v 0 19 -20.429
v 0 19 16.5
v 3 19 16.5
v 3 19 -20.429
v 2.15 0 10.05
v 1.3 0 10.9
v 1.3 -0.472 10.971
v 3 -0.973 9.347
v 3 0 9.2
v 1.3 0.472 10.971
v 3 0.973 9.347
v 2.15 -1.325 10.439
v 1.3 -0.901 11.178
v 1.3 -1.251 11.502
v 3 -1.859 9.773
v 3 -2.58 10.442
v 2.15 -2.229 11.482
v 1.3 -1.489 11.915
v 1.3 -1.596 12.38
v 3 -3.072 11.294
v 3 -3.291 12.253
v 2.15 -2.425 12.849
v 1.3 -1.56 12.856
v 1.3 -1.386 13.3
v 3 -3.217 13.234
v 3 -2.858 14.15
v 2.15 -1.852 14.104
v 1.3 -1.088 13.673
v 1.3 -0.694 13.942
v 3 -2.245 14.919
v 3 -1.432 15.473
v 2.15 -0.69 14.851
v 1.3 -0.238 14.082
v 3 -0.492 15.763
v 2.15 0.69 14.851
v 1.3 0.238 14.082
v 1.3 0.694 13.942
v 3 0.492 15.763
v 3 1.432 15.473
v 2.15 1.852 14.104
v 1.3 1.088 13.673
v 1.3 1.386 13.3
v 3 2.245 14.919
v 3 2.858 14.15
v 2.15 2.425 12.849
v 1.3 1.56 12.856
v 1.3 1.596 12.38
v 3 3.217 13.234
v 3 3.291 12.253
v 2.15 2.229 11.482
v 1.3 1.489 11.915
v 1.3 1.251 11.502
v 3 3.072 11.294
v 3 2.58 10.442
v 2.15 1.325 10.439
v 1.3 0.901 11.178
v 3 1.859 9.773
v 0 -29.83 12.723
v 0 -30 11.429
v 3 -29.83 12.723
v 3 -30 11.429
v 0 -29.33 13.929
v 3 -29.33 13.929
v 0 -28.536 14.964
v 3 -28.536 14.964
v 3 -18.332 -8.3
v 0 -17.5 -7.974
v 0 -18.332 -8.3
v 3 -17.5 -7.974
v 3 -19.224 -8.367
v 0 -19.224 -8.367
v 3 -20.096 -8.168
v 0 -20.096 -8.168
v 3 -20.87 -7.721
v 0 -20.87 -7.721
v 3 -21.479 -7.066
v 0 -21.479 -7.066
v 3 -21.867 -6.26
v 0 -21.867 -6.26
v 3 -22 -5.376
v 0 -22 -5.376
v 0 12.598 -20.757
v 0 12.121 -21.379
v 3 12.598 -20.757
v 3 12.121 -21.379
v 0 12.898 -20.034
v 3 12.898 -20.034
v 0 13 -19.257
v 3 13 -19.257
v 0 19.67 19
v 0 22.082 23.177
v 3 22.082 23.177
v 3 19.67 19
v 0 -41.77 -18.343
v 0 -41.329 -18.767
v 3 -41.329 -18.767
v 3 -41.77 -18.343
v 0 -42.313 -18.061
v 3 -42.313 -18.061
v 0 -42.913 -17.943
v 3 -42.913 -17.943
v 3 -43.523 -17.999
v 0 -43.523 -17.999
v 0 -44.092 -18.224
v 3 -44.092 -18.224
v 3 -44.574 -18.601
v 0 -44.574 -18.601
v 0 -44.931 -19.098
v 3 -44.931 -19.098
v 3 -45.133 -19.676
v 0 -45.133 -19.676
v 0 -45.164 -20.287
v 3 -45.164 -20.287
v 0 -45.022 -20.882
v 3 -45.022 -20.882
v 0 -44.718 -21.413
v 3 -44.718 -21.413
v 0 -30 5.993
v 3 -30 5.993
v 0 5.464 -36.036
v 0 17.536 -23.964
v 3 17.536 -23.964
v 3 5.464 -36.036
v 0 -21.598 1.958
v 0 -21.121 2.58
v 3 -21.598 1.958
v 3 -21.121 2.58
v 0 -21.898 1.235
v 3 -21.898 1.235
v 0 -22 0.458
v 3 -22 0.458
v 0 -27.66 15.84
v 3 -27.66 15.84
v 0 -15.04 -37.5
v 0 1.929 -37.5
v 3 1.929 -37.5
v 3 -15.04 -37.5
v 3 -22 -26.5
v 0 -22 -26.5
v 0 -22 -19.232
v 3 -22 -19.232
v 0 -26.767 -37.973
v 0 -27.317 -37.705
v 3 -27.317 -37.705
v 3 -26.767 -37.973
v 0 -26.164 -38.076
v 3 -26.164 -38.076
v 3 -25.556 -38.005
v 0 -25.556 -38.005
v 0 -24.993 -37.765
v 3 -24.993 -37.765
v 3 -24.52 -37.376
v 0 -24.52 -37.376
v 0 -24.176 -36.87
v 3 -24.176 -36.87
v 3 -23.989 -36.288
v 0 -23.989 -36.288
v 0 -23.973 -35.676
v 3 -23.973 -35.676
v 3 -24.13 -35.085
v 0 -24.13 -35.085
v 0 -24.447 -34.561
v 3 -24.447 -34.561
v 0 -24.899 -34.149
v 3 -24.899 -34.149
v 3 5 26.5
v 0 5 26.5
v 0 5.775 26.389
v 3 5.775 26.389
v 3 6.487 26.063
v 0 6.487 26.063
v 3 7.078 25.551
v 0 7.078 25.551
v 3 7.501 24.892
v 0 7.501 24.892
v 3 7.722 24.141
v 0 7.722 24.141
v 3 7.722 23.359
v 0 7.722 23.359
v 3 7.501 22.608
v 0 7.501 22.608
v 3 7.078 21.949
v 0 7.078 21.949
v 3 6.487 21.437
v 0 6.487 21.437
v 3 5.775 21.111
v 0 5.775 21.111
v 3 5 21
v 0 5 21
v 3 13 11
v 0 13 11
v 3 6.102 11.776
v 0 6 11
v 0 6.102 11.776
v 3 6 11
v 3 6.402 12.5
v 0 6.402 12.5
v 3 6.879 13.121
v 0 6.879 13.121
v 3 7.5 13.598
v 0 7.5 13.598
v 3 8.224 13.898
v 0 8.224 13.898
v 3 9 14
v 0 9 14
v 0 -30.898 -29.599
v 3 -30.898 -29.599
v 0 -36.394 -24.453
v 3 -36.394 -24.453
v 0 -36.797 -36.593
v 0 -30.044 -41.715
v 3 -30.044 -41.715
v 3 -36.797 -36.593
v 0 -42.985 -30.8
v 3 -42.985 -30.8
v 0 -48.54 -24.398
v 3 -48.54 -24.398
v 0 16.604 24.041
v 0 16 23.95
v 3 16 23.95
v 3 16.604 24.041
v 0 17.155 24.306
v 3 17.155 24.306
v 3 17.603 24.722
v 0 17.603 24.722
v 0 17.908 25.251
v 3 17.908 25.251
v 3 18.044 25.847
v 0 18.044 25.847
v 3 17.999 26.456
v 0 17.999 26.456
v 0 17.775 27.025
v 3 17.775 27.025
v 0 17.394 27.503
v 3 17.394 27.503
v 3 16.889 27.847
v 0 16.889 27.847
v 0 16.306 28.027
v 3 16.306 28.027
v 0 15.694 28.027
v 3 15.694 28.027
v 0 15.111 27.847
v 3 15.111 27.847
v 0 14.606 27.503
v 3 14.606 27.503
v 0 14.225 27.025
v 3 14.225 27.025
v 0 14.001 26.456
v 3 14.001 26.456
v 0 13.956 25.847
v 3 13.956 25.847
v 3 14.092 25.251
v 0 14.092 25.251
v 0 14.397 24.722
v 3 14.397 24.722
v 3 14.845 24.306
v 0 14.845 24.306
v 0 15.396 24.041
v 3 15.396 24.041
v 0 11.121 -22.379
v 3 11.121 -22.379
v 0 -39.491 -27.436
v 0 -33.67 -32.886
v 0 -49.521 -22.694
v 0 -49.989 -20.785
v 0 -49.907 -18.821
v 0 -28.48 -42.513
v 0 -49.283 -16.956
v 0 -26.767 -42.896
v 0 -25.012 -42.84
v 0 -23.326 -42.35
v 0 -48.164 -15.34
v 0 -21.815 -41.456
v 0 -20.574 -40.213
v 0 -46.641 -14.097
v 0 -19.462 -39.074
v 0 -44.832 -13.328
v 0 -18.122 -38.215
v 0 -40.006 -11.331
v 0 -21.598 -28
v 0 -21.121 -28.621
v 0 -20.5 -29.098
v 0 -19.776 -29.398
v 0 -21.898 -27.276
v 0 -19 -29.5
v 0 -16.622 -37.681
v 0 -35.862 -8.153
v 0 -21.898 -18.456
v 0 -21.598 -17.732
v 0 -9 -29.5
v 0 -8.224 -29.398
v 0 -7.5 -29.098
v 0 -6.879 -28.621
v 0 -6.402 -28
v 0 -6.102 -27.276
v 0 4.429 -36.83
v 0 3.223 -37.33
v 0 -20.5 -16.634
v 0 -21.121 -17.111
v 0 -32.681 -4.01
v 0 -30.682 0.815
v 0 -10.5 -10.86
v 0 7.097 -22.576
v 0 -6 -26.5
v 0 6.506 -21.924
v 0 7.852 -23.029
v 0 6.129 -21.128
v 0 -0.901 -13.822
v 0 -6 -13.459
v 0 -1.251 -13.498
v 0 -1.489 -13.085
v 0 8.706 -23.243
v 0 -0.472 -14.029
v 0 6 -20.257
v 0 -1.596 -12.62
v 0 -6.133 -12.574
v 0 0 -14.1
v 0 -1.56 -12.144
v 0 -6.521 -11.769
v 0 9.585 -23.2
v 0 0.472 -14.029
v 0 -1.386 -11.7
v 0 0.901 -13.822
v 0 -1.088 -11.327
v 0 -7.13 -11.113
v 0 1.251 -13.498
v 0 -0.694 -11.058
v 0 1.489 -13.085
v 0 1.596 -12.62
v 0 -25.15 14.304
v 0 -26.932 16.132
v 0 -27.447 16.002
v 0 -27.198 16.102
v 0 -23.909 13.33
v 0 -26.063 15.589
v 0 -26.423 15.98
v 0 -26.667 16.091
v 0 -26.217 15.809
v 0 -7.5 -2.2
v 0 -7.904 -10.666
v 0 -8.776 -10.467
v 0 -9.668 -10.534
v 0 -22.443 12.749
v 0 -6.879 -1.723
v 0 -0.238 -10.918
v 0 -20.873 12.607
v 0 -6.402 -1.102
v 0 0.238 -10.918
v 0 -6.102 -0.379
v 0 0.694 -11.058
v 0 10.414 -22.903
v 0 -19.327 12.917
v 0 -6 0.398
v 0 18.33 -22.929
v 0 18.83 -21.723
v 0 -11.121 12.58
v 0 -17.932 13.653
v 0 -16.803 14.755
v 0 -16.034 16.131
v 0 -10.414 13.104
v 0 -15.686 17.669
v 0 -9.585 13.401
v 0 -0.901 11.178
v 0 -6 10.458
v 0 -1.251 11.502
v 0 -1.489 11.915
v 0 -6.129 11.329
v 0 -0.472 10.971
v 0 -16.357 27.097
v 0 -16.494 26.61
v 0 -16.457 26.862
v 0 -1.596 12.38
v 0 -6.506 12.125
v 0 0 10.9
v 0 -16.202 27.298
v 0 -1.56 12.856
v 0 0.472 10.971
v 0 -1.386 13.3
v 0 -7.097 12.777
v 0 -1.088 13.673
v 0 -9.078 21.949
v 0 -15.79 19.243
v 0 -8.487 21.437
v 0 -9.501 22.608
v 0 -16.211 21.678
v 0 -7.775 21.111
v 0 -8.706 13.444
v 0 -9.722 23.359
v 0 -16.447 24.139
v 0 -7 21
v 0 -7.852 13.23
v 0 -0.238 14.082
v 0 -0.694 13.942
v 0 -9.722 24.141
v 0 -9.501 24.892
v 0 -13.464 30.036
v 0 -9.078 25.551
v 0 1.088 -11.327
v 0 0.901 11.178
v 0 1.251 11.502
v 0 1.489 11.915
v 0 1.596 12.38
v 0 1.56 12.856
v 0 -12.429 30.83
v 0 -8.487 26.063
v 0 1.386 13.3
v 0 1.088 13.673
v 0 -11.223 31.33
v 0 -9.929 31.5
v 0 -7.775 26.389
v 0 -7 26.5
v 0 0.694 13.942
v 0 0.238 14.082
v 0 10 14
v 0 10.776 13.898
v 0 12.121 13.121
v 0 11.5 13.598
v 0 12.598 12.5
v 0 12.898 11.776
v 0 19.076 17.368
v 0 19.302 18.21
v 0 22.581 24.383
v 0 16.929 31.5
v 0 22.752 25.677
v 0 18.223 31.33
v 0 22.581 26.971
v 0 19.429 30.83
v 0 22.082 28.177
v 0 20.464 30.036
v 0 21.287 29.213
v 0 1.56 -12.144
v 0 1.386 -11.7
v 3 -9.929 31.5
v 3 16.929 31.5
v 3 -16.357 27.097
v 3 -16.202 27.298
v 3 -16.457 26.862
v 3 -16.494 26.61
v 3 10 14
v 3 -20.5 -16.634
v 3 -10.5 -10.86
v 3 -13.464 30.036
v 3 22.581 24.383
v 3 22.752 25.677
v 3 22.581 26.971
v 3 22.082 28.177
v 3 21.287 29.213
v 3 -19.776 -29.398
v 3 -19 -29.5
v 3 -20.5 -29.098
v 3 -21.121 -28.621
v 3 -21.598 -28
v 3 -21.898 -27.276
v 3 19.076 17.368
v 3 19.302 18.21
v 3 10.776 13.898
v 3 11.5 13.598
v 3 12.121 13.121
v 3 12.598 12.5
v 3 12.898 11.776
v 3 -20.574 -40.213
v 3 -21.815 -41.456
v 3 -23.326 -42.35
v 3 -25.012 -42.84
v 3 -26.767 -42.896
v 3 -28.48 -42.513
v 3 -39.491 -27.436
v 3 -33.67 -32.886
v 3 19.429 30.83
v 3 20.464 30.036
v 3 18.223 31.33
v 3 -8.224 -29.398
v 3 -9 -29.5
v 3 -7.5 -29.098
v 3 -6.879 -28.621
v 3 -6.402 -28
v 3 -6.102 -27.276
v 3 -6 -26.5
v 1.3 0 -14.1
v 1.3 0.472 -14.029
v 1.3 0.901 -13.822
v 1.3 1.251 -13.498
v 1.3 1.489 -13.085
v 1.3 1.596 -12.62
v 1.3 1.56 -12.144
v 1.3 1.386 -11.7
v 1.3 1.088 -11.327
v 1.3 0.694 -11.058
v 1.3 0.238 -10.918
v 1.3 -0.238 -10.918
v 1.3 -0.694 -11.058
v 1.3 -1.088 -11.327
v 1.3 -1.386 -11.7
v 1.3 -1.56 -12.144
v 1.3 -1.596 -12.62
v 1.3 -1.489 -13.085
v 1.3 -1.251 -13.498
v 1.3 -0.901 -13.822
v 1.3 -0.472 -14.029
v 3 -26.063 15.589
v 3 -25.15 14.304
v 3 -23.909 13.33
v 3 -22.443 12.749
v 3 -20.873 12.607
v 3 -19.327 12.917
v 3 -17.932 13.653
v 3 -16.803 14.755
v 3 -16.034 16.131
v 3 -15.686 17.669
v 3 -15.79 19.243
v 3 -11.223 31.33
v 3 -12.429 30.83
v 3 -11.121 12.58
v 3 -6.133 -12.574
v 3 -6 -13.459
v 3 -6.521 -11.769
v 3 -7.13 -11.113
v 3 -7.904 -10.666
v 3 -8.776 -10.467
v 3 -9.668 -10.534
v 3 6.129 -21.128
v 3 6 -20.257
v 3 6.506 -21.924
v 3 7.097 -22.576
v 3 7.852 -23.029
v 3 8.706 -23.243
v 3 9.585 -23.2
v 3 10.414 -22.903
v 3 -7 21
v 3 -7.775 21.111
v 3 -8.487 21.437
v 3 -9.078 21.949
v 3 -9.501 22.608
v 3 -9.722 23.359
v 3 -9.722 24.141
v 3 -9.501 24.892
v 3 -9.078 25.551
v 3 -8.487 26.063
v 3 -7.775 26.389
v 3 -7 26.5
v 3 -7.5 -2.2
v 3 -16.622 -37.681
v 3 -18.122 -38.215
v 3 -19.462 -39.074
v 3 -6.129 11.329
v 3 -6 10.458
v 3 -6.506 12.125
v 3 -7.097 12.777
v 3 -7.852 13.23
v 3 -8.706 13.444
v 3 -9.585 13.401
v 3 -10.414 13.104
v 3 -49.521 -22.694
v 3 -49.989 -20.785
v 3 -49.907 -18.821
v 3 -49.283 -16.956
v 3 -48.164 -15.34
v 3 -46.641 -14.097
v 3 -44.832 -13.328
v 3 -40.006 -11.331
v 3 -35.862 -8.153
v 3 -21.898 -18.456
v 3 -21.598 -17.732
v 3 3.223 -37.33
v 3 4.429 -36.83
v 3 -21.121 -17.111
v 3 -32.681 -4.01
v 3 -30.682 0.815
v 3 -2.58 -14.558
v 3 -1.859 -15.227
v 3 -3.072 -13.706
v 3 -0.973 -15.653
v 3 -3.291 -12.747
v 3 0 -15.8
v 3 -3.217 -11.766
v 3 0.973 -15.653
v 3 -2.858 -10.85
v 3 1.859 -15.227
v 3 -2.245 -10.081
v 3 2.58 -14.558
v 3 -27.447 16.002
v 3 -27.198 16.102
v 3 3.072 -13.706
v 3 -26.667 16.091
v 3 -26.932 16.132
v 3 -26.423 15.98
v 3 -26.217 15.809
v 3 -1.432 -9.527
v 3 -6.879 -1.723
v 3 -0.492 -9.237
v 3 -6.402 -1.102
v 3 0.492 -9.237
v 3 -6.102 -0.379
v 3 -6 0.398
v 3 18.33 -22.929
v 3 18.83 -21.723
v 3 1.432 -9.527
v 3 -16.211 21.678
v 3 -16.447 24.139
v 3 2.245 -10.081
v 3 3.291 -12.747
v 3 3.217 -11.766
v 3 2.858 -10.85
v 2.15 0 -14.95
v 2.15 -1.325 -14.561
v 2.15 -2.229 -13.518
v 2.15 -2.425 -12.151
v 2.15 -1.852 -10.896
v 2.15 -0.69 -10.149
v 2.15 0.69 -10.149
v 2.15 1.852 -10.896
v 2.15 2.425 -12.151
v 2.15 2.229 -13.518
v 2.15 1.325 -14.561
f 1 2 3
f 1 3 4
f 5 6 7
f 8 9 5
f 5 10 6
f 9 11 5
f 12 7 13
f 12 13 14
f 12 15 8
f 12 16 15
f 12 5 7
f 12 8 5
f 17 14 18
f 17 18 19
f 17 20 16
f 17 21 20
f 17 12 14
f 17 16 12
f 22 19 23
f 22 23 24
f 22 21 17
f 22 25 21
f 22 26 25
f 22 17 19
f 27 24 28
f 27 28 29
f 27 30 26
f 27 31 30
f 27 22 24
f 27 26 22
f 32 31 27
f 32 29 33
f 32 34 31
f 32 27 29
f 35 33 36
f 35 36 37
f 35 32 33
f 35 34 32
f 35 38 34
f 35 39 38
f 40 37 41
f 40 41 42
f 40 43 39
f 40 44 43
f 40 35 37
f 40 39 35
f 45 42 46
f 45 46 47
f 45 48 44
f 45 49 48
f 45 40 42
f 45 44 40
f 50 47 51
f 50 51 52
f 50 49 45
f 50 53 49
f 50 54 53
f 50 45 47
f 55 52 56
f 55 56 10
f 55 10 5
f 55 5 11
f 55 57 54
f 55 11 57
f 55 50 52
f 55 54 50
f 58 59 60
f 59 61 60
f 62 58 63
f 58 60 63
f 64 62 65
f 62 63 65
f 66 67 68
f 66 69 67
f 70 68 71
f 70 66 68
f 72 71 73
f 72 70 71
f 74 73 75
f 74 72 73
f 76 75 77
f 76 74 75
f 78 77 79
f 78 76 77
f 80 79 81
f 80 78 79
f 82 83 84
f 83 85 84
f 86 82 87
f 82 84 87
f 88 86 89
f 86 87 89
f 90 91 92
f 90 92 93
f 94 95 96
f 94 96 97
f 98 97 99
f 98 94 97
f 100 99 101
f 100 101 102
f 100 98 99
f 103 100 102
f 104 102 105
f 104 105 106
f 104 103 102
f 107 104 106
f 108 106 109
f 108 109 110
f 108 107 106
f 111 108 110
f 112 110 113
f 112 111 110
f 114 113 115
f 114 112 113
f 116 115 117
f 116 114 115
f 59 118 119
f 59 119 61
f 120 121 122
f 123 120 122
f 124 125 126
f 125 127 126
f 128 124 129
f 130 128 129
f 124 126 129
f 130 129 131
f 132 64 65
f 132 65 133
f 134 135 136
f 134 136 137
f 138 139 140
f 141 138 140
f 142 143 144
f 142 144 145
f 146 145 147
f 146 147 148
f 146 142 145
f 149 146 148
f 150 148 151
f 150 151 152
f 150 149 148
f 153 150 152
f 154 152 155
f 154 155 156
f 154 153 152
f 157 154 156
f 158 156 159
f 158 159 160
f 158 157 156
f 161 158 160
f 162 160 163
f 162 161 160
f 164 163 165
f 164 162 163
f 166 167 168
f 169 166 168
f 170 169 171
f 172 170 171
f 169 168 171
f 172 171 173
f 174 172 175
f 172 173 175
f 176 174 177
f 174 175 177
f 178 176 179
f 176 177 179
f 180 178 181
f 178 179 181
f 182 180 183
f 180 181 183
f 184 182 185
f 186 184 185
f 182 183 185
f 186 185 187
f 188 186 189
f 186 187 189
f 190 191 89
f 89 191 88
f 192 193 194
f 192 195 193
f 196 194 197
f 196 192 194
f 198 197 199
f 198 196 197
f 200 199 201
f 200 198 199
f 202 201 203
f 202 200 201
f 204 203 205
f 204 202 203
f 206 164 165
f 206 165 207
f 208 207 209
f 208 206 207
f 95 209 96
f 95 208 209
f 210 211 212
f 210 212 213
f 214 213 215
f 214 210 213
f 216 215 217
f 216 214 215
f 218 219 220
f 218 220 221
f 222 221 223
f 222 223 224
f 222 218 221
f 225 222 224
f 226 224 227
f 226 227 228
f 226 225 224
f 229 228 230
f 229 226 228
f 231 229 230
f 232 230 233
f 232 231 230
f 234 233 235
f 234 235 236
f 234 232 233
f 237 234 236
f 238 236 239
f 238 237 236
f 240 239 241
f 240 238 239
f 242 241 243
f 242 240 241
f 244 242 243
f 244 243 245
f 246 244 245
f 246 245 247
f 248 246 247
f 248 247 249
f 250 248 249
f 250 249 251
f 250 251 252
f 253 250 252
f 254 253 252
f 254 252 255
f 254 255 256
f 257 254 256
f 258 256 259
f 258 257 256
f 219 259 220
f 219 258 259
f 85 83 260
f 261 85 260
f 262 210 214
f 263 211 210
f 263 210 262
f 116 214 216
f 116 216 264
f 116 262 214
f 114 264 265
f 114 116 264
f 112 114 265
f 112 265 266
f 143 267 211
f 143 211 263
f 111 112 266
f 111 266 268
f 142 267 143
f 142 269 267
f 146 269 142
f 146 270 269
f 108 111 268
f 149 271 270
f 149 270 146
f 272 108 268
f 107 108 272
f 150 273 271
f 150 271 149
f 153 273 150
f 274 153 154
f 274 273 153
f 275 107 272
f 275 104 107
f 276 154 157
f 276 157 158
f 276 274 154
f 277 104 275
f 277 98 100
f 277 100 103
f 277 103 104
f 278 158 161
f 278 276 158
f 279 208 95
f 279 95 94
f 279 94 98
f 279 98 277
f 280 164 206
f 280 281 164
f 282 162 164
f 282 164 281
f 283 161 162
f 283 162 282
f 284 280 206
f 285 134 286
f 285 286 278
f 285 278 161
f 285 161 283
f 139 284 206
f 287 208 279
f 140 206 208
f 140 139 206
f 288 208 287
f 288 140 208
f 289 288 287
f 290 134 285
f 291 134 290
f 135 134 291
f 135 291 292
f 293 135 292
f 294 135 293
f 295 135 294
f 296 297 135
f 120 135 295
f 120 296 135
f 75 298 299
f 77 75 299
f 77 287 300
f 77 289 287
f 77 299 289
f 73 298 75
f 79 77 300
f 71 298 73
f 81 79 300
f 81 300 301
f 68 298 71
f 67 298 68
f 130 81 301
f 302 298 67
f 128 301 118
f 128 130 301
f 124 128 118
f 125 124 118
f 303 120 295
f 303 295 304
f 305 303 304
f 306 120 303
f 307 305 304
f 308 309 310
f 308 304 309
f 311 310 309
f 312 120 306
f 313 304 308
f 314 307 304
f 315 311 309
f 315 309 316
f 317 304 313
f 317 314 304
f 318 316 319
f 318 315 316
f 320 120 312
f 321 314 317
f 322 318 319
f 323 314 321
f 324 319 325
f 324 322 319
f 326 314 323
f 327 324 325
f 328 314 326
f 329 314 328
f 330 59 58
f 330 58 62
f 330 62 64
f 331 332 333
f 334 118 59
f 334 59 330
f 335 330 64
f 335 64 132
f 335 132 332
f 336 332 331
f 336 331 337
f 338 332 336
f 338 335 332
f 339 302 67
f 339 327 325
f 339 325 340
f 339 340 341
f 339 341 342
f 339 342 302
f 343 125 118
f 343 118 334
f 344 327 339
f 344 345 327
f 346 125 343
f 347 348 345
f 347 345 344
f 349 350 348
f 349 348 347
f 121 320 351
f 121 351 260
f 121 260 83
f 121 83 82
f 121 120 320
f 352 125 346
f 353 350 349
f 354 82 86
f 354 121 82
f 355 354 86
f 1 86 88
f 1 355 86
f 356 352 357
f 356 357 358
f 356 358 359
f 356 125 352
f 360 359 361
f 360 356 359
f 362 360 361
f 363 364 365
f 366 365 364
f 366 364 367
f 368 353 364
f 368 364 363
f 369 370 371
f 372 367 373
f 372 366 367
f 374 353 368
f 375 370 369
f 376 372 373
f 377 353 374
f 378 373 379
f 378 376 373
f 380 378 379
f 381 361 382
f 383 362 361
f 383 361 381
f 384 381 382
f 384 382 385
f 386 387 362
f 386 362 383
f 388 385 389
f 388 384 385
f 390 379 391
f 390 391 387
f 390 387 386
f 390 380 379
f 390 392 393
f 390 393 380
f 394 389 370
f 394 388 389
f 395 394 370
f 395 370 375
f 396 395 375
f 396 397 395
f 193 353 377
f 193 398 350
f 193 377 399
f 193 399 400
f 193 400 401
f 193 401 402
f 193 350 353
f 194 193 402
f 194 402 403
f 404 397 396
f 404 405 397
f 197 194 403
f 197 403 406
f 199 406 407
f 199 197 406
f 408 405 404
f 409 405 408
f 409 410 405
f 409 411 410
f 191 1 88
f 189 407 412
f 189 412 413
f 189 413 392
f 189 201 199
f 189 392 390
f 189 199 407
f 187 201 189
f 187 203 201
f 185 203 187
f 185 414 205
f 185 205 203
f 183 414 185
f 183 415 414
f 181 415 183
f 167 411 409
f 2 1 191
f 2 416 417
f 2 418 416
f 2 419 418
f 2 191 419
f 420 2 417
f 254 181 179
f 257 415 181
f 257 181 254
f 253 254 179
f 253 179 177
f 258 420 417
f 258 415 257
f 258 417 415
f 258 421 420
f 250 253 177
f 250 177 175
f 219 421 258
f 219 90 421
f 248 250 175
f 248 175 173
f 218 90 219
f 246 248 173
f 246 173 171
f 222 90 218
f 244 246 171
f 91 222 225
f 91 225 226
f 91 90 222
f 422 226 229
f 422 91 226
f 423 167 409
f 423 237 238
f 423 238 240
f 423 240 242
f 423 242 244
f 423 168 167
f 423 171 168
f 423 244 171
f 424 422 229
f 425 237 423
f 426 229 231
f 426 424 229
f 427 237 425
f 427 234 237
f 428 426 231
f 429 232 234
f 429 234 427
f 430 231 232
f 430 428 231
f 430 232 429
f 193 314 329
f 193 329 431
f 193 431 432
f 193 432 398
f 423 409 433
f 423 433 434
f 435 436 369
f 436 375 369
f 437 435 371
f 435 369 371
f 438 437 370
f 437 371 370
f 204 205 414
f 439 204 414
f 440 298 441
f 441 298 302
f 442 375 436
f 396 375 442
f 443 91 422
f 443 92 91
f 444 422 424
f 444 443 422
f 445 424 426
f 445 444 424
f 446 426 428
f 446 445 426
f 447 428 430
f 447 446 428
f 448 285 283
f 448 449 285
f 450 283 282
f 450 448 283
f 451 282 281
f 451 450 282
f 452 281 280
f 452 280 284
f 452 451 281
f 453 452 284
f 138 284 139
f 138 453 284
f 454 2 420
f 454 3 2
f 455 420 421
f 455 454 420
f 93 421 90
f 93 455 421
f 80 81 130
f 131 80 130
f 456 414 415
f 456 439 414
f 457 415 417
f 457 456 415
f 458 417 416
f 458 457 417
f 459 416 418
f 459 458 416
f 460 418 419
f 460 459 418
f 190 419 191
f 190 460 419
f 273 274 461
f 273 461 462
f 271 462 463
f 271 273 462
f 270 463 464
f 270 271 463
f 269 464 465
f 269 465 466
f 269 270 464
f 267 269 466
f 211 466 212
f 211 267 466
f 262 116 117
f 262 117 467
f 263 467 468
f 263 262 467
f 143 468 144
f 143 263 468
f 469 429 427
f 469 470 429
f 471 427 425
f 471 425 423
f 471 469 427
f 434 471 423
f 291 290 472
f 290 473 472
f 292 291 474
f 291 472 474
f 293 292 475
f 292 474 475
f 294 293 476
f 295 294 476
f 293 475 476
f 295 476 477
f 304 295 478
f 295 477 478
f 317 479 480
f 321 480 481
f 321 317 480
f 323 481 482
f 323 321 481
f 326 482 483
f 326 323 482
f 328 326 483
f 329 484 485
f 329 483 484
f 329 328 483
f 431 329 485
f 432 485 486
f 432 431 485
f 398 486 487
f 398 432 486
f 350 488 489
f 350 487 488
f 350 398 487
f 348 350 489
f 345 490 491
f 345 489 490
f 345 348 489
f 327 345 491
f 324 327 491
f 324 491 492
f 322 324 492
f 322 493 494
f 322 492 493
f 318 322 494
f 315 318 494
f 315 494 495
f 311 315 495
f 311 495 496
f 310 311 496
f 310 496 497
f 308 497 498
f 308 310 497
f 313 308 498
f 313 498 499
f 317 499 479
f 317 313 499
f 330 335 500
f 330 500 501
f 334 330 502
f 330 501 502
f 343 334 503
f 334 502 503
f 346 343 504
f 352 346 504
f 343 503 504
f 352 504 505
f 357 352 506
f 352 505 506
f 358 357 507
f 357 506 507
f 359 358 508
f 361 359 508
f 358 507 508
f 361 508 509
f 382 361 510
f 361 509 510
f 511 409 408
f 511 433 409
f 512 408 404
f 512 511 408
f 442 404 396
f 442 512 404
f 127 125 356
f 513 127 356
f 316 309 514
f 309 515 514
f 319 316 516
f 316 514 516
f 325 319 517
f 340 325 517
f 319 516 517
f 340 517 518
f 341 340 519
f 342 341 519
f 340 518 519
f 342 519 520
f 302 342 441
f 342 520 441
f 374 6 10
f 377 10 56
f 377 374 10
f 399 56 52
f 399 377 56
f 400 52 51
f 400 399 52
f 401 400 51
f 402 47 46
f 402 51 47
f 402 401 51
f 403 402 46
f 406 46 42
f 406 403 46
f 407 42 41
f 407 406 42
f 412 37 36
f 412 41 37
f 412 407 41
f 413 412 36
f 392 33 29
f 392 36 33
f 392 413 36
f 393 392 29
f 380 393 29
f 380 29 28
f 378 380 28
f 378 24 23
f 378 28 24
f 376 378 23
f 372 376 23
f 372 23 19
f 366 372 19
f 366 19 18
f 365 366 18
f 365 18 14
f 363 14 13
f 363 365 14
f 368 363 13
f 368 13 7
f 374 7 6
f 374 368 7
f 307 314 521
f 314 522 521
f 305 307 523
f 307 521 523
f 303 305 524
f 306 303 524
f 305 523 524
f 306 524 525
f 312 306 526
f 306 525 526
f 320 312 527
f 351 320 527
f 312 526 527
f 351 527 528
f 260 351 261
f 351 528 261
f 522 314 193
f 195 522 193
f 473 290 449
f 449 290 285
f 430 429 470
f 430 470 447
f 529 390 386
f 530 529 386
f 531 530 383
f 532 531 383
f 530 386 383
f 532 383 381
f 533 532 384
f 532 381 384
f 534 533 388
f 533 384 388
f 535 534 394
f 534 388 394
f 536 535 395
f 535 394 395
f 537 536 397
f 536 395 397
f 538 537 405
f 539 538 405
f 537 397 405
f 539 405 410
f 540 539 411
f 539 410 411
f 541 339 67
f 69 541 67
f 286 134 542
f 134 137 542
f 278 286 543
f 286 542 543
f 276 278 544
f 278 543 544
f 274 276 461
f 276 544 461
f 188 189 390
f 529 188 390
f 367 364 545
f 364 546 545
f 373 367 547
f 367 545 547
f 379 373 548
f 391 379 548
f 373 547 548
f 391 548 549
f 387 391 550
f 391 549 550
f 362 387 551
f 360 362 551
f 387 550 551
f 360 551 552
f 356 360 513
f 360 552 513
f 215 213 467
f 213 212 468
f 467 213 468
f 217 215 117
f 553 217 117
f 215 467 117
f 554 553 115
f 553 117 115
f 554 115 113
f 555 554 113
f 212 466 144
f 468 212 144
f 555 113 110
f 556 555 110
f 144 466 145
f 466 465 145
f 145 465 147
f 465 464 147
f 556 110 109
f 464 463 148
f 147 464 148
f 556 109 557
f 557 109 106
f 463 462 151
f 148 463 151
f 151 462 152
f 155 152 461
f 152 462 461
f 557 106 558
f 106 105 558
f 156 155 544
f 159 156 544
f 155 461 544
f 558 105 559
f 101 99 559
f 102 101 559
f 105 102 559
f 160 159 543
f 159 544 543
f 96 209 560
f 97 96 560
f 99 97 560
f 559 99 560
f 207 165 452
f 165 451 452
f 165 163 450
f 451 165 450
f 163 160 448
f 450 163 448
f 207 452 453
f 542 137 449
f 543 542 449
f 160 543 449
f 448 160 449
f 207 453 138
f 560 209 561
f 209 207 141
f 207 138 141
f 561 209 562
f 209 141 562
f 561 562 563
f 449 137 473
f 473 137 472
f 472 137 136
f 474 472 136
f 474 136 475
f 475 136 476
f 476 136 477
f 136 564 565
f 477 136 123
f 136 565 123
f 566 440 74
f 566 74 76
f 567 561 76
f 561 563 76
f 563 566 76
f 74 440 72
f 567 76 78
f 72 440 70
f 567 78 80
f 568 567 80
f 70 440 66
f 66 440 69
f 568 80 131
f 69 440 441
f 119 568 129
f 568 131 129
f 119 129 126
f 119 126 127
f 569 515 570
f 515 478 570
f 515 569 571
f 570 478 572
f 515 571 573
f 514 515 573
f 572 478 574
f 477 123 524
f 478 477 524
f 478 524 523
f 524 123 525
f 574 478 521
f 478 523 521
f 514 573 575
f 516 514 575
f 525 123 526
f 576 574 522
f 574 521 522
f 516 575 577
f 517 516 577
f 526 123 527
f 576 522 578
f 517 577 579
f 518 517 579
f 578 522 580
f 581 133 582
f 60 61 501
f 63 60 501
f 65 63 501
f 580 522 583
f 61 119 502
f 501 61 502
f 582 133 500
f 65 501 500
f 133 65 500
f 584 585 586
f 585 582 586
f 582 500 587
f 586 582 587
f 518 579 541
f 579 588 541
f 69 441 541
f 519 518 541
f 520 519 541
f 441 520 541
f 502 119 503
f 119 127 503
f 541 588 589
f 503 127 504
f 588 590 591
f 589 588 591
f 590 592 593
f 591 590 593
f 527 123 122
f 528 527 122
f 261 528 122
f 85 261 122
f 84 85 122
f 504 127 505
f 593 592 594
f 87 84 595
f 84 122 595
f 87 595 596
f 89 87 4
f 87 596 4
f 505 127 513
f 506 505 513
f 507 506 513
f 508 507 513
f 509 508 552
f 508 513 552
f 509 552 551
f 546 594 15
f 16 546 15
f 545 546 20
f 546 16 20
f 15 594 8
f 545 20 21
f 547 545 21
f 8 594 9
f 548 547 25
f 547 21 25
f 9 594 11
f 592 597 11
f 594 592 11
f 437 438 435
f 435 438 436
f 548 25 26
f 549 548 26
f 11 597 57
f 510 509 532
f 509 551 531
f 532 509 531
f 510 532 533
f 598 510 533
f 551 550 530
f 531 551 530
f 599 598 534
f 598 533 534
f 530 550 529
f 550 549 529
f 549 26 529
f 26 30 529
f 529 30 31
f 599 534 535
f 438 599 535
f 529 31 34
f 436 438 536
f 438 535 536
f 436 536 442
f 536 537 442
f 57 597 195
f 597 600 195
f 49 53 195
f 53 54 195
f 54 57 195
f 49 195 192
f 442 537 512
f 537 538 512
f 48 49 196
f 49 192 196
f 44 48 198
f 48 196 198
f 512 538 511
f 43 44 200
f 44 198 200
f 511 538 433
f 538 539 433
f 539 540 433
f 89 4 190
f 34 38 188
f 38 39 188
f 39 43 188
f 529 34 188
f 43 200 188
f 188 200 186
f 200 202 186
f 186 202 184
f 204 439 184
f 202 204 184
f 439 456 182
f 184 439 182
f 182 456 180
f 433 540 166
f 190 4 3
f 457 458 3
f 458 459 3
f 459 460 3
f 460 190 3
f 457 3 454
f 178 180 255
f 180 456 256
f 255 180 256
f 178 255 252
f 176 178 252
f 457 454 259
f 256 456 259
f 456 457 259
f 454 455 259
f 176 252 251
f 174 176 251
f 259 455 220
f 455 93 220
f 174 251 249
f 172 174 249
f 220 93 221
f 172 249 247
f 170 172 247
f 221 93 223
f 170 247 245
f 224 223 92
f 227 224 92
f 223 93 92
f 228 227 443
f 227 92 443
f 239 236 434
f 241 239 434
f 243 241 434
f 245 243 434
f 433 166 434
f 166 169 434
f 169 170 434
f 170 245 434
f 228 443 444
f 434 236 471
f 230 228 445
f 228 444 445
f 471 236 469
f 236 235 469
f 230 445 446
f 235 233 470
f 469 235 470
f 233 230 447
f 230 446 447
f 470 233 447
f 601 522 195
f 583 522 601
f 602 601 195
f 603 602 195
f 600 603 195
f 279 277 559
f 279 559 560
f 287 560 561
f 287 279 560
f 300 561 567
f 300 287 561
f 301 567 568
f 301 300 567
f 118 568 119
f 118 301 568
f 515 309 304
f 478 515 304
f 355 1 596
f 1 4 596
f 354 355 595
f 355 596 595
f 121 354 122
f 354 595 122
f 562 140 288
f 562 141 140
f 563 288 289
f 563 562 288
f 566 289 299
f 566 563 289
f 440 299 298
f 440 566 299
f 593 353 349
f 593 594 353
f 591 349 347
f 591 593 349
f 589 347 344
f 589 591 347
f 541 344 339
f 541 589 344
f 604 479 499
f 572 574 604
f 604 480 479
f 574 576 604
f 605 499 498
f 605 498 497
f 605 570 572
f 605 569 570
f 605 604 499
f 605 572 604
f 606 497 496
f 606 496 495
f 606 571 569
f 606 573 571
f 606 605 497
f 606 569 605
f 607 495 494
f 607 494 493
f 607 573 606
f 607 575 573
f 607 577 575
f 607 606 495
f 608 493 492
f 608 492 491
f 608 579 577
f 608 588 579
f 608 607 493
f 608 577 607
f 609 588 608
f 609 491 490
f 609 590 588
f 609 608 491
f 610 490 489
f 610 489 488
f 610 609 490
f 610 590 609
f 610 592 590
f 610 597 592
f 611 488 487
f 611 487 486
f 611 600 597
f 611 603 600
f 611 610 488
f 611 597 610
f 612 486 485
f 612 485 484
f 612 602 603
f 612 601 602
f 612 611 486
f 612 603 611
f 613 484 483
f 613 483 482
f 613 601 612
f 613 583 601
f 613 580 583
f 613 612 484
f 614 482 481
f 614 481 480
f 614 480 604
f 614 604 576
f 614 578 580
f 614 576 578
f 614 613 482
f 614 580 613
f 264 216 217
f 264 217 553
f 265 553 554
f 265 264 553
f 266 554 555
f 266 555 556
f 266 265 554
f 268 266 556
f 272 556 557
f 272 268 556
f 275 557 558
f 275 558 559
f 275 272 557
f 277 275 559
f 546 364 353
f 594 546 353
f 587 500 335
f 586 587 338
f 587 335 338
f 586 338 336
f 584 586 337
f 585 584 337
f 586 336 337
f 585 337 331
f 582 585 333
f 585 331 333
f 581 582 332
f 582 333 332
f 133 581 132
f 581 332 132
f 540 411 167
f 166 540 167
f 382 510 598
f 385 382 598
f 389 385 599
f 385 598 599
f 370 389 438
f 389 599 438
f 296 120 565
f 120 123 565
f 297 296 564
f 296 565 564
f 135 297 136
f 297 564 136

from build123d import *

# Parameters (mm, degrees)
SKETCH_1_R               = 1.6
SKETCH_1_R_2             = 2.05
EXTRUDE_1_DEPTH          = 3
HOLE_WIZARD_2_AT_2_COUNT = 2
HOLE_WIZARD_2_AT_2_PITCH = 25
FILLET_1_R               = 7
CUT_EXTRUDE_1_DEPTH      = 10
FILLET_2_R               = 1
CHAMFER_1_SIZE           = 15
FILLET_3_R               = 5
FILLET_4_R               = 3


with BuildPart() as part:
    # 草图1 → 凸台-拉伸1 (new body)
    with BuildSketch(Plane(origin=(0, 0, 0), x_dir=(0, 0, -1), z_dir=(1, 0, 0))):
        with BuildLine():
            Line((-17.839745962, 19), (37.5, 19))
            Line((37.5, 19), (37.5, -19.287265359))
            ThreePointArc((37.5, -19.287265359), (42.444079317, -23.554230469), (41.715171734, -30.044192356))
            ThreePointArc((41.715171734, -30.044192356), (33.776357191, -39.966054476), (24.398111919, -48.540238981))
            ThreePointArc((24.398111919, -48.540238981), (17.866480238, -49.660583483), (13.327617661, -44.831907605))
            ThreePointArc((13.327617661, -44.831907605), (6.185514087, -34.135545268), (-5.993117858, -30))
            Line((-5.993117858, -30), (-13.5, -30))
            Line((-13.5, -30), (-31.5, -12))
            Line((-31.5, -12), (-31.5, 19))
            Line((-31.5, 19), (-26.5, 24))
            Line((-26.5, 24), (-17.839745962, 19))
        make_face()
        with Locations((-12.5, 0)):
            Circle(SKETCH_1_R, mode=Mode.SUBTRACT)
        with Locations((12.5, 0)):
            Circle(SKETCH_1_R, mode=Mode.SUBTRACT)
        with Locations((-26, 16)):
            Circle(SKETCH_1_R_2, mode=Mode.SUBTRACT)
        Polygon((-17.701010127, -6), (1.334192463, -6), (10.57179677, -22), (-1.701010127, -22), align=None, mode=Mode.SUBTRACT)
        Polygon((29.5, -6), (29.5, -22), (17.5, -22), (8.262395693, -6), align=None, mode=Mode.SUBTRACT)
        Polygon((27.5, 6), (-14, 6), (-14, 13), (20.5, 13), align=None, mode=Mode.SUBTRACT)
        with BuildLine():
            Line((-21, 5), (-21, -7))
            ThreePointArc((-21, -7), (-23.75, -9.75), (-26.5, -7))
            Line((-26.5, -7), (-26.5, 5))
            ThreePointArc((-26.5, 5), (-23.75, 7.75), (-21, 5))
        make_face(mode=Mode.SUBTRACT)
        with BuildLine():
            ThreePointArc((18.766630925, -41.32851784), (18.395317666, -44.346319435), (21.413119261, -44.717632693))
            ThreePointArc((21.413119261, -44.717632693), (30.23590735, -36.651282249), (37.704519693, -27.317074793))
            ThreePointArc((37.704519693, -27.317074793), (37.135530181, -24.330228474), (34.148683862, -24.899217985))
            ThreePointArc((34.148683862, -24.899217985), (27.096951821, -33.712412026), (18.766630925, -41.32851784))
        make_face(mode=Mode.SUBTRACT)
    extrude(amount=EXTRUDE_1_DEPTH)

    # 草图3 → 打孔尺寸(%根据十字)槽沉头木螺钉的类型2 (revolve, cut)
    with BuildSketch(Plane(origin=(3, 0, -12.5), x_dir=(0, 0, -1), z_dir=(0, 1, 0))):
        Polygon((0, 0), (0, 3), (1.55, 3), (1.55, 1.75), (3.3, 0), align=None)
    hole_wizard_2 = revolve(axis=Axis((9.35, 0, -12.5), (-1, 0, 0)), mode=Mode.SUBTRACT)

    # 打孔尺寸(%根据十字)槽沉头木螺钉的类型2 at 2: 打孔尺寸(%根据十字)槽沉头木螺钉的类型2 ×2
    with Locations(*[(0, 0, i * HOLE_WIZARD_2_AT_2_PITCH) for i in range(1, HOLE_WIZARD_2_AT_2_COUNT)]):
        add(hole_wizard_2, mode=Mode.SUBTRACT)

    # 圆角1
    fillet_1_edges = [part.edges().sort_by_distance(p)[0] for p in [
        (1.5, -19.287265359, -37.5),
    ]]
    fillet(fillet_1_edges, radius=FILLET_1_R)

    # 草图5 → 切除-拉伸1 (cut)
    with BuildSketch(Plane(origin=(3, 0, 0), x_dir=(0, 0, -1), z_dir=(1, 0, 0))):
        with BuildLine():
            Line((-27.015881022, -16.484118978), (-16.951503299, -26.548496701))
            ThreePointArc((-16.951503299, -26.548496701), (-12.720005473, -20.02392536), (-19.242870048, -15.789797024))
            ThreePointArc((-19.242870048, -15.789797024), (-23.108459656, -16.37111358), (-27.015881022, -16.484118978))
        make_face()
    extrude(amount=-CUT_EXTRUDE_1_DEPTH, mode=Mode.SUBTRACT)

    # 圆角2
    fillet_2_edges = [part.edges().sort_by_distance(p)[0] for p in [
        (1.5, -26.548496701, 16.951503299),
        (1.5, -16.484118978, 27.015881022),
    ]]
    fillet(fillet_2_edges, radius=FILLET_2_R)

    # 倒角1
    chamfer_1_edges = [part.edges().sort_by_distance(p)[0] for p in [
        (1.5, 19, -37.5),
    ]]
    chamfer(chamfer_1_edges, length=CHAMFER_1_SIZE)

    # 圆角3
    fillet_3_edges = [part.edges().sort_by_distance(p)[0] for p in [
        (1.5, 19, -22.5),
        (1.5, 4, -37.5),
        (1.5, 24, 26.5),
        (1.5, 19, 17.839745962),
        (1.5, -30, 13.5),
        (1.5, -12, 31.5),
        (1.5, 19, 31.5),
    ]]
    fillet(fillet_3_edges, radius=FILLET_3_R)

    # 圆角4
    fillet_4_edges = [part.edges().sort_by_distance(p)[0] for p in [
        (1.5, -6, 17.701010127),
        (1.5, -22, 1.701010127),
        (1.5, -22, -10.57179677),
        (1.5, -6, -1.334192463),
        (1.5, -22, -17.5),
        (1.5, -22, -29.5),
        (1.5, -6, -29.5),
        (1.5, -6, -8.262395693),
        (1.5, 13, -20.5),
        (1.5, 13, 14),
        (1.5, 6, 14),
        (1.5, 6, -27.5),
    ]]
    fillet(fillet_4_edges, radius=FILLET_4_R)


solid = part.part
